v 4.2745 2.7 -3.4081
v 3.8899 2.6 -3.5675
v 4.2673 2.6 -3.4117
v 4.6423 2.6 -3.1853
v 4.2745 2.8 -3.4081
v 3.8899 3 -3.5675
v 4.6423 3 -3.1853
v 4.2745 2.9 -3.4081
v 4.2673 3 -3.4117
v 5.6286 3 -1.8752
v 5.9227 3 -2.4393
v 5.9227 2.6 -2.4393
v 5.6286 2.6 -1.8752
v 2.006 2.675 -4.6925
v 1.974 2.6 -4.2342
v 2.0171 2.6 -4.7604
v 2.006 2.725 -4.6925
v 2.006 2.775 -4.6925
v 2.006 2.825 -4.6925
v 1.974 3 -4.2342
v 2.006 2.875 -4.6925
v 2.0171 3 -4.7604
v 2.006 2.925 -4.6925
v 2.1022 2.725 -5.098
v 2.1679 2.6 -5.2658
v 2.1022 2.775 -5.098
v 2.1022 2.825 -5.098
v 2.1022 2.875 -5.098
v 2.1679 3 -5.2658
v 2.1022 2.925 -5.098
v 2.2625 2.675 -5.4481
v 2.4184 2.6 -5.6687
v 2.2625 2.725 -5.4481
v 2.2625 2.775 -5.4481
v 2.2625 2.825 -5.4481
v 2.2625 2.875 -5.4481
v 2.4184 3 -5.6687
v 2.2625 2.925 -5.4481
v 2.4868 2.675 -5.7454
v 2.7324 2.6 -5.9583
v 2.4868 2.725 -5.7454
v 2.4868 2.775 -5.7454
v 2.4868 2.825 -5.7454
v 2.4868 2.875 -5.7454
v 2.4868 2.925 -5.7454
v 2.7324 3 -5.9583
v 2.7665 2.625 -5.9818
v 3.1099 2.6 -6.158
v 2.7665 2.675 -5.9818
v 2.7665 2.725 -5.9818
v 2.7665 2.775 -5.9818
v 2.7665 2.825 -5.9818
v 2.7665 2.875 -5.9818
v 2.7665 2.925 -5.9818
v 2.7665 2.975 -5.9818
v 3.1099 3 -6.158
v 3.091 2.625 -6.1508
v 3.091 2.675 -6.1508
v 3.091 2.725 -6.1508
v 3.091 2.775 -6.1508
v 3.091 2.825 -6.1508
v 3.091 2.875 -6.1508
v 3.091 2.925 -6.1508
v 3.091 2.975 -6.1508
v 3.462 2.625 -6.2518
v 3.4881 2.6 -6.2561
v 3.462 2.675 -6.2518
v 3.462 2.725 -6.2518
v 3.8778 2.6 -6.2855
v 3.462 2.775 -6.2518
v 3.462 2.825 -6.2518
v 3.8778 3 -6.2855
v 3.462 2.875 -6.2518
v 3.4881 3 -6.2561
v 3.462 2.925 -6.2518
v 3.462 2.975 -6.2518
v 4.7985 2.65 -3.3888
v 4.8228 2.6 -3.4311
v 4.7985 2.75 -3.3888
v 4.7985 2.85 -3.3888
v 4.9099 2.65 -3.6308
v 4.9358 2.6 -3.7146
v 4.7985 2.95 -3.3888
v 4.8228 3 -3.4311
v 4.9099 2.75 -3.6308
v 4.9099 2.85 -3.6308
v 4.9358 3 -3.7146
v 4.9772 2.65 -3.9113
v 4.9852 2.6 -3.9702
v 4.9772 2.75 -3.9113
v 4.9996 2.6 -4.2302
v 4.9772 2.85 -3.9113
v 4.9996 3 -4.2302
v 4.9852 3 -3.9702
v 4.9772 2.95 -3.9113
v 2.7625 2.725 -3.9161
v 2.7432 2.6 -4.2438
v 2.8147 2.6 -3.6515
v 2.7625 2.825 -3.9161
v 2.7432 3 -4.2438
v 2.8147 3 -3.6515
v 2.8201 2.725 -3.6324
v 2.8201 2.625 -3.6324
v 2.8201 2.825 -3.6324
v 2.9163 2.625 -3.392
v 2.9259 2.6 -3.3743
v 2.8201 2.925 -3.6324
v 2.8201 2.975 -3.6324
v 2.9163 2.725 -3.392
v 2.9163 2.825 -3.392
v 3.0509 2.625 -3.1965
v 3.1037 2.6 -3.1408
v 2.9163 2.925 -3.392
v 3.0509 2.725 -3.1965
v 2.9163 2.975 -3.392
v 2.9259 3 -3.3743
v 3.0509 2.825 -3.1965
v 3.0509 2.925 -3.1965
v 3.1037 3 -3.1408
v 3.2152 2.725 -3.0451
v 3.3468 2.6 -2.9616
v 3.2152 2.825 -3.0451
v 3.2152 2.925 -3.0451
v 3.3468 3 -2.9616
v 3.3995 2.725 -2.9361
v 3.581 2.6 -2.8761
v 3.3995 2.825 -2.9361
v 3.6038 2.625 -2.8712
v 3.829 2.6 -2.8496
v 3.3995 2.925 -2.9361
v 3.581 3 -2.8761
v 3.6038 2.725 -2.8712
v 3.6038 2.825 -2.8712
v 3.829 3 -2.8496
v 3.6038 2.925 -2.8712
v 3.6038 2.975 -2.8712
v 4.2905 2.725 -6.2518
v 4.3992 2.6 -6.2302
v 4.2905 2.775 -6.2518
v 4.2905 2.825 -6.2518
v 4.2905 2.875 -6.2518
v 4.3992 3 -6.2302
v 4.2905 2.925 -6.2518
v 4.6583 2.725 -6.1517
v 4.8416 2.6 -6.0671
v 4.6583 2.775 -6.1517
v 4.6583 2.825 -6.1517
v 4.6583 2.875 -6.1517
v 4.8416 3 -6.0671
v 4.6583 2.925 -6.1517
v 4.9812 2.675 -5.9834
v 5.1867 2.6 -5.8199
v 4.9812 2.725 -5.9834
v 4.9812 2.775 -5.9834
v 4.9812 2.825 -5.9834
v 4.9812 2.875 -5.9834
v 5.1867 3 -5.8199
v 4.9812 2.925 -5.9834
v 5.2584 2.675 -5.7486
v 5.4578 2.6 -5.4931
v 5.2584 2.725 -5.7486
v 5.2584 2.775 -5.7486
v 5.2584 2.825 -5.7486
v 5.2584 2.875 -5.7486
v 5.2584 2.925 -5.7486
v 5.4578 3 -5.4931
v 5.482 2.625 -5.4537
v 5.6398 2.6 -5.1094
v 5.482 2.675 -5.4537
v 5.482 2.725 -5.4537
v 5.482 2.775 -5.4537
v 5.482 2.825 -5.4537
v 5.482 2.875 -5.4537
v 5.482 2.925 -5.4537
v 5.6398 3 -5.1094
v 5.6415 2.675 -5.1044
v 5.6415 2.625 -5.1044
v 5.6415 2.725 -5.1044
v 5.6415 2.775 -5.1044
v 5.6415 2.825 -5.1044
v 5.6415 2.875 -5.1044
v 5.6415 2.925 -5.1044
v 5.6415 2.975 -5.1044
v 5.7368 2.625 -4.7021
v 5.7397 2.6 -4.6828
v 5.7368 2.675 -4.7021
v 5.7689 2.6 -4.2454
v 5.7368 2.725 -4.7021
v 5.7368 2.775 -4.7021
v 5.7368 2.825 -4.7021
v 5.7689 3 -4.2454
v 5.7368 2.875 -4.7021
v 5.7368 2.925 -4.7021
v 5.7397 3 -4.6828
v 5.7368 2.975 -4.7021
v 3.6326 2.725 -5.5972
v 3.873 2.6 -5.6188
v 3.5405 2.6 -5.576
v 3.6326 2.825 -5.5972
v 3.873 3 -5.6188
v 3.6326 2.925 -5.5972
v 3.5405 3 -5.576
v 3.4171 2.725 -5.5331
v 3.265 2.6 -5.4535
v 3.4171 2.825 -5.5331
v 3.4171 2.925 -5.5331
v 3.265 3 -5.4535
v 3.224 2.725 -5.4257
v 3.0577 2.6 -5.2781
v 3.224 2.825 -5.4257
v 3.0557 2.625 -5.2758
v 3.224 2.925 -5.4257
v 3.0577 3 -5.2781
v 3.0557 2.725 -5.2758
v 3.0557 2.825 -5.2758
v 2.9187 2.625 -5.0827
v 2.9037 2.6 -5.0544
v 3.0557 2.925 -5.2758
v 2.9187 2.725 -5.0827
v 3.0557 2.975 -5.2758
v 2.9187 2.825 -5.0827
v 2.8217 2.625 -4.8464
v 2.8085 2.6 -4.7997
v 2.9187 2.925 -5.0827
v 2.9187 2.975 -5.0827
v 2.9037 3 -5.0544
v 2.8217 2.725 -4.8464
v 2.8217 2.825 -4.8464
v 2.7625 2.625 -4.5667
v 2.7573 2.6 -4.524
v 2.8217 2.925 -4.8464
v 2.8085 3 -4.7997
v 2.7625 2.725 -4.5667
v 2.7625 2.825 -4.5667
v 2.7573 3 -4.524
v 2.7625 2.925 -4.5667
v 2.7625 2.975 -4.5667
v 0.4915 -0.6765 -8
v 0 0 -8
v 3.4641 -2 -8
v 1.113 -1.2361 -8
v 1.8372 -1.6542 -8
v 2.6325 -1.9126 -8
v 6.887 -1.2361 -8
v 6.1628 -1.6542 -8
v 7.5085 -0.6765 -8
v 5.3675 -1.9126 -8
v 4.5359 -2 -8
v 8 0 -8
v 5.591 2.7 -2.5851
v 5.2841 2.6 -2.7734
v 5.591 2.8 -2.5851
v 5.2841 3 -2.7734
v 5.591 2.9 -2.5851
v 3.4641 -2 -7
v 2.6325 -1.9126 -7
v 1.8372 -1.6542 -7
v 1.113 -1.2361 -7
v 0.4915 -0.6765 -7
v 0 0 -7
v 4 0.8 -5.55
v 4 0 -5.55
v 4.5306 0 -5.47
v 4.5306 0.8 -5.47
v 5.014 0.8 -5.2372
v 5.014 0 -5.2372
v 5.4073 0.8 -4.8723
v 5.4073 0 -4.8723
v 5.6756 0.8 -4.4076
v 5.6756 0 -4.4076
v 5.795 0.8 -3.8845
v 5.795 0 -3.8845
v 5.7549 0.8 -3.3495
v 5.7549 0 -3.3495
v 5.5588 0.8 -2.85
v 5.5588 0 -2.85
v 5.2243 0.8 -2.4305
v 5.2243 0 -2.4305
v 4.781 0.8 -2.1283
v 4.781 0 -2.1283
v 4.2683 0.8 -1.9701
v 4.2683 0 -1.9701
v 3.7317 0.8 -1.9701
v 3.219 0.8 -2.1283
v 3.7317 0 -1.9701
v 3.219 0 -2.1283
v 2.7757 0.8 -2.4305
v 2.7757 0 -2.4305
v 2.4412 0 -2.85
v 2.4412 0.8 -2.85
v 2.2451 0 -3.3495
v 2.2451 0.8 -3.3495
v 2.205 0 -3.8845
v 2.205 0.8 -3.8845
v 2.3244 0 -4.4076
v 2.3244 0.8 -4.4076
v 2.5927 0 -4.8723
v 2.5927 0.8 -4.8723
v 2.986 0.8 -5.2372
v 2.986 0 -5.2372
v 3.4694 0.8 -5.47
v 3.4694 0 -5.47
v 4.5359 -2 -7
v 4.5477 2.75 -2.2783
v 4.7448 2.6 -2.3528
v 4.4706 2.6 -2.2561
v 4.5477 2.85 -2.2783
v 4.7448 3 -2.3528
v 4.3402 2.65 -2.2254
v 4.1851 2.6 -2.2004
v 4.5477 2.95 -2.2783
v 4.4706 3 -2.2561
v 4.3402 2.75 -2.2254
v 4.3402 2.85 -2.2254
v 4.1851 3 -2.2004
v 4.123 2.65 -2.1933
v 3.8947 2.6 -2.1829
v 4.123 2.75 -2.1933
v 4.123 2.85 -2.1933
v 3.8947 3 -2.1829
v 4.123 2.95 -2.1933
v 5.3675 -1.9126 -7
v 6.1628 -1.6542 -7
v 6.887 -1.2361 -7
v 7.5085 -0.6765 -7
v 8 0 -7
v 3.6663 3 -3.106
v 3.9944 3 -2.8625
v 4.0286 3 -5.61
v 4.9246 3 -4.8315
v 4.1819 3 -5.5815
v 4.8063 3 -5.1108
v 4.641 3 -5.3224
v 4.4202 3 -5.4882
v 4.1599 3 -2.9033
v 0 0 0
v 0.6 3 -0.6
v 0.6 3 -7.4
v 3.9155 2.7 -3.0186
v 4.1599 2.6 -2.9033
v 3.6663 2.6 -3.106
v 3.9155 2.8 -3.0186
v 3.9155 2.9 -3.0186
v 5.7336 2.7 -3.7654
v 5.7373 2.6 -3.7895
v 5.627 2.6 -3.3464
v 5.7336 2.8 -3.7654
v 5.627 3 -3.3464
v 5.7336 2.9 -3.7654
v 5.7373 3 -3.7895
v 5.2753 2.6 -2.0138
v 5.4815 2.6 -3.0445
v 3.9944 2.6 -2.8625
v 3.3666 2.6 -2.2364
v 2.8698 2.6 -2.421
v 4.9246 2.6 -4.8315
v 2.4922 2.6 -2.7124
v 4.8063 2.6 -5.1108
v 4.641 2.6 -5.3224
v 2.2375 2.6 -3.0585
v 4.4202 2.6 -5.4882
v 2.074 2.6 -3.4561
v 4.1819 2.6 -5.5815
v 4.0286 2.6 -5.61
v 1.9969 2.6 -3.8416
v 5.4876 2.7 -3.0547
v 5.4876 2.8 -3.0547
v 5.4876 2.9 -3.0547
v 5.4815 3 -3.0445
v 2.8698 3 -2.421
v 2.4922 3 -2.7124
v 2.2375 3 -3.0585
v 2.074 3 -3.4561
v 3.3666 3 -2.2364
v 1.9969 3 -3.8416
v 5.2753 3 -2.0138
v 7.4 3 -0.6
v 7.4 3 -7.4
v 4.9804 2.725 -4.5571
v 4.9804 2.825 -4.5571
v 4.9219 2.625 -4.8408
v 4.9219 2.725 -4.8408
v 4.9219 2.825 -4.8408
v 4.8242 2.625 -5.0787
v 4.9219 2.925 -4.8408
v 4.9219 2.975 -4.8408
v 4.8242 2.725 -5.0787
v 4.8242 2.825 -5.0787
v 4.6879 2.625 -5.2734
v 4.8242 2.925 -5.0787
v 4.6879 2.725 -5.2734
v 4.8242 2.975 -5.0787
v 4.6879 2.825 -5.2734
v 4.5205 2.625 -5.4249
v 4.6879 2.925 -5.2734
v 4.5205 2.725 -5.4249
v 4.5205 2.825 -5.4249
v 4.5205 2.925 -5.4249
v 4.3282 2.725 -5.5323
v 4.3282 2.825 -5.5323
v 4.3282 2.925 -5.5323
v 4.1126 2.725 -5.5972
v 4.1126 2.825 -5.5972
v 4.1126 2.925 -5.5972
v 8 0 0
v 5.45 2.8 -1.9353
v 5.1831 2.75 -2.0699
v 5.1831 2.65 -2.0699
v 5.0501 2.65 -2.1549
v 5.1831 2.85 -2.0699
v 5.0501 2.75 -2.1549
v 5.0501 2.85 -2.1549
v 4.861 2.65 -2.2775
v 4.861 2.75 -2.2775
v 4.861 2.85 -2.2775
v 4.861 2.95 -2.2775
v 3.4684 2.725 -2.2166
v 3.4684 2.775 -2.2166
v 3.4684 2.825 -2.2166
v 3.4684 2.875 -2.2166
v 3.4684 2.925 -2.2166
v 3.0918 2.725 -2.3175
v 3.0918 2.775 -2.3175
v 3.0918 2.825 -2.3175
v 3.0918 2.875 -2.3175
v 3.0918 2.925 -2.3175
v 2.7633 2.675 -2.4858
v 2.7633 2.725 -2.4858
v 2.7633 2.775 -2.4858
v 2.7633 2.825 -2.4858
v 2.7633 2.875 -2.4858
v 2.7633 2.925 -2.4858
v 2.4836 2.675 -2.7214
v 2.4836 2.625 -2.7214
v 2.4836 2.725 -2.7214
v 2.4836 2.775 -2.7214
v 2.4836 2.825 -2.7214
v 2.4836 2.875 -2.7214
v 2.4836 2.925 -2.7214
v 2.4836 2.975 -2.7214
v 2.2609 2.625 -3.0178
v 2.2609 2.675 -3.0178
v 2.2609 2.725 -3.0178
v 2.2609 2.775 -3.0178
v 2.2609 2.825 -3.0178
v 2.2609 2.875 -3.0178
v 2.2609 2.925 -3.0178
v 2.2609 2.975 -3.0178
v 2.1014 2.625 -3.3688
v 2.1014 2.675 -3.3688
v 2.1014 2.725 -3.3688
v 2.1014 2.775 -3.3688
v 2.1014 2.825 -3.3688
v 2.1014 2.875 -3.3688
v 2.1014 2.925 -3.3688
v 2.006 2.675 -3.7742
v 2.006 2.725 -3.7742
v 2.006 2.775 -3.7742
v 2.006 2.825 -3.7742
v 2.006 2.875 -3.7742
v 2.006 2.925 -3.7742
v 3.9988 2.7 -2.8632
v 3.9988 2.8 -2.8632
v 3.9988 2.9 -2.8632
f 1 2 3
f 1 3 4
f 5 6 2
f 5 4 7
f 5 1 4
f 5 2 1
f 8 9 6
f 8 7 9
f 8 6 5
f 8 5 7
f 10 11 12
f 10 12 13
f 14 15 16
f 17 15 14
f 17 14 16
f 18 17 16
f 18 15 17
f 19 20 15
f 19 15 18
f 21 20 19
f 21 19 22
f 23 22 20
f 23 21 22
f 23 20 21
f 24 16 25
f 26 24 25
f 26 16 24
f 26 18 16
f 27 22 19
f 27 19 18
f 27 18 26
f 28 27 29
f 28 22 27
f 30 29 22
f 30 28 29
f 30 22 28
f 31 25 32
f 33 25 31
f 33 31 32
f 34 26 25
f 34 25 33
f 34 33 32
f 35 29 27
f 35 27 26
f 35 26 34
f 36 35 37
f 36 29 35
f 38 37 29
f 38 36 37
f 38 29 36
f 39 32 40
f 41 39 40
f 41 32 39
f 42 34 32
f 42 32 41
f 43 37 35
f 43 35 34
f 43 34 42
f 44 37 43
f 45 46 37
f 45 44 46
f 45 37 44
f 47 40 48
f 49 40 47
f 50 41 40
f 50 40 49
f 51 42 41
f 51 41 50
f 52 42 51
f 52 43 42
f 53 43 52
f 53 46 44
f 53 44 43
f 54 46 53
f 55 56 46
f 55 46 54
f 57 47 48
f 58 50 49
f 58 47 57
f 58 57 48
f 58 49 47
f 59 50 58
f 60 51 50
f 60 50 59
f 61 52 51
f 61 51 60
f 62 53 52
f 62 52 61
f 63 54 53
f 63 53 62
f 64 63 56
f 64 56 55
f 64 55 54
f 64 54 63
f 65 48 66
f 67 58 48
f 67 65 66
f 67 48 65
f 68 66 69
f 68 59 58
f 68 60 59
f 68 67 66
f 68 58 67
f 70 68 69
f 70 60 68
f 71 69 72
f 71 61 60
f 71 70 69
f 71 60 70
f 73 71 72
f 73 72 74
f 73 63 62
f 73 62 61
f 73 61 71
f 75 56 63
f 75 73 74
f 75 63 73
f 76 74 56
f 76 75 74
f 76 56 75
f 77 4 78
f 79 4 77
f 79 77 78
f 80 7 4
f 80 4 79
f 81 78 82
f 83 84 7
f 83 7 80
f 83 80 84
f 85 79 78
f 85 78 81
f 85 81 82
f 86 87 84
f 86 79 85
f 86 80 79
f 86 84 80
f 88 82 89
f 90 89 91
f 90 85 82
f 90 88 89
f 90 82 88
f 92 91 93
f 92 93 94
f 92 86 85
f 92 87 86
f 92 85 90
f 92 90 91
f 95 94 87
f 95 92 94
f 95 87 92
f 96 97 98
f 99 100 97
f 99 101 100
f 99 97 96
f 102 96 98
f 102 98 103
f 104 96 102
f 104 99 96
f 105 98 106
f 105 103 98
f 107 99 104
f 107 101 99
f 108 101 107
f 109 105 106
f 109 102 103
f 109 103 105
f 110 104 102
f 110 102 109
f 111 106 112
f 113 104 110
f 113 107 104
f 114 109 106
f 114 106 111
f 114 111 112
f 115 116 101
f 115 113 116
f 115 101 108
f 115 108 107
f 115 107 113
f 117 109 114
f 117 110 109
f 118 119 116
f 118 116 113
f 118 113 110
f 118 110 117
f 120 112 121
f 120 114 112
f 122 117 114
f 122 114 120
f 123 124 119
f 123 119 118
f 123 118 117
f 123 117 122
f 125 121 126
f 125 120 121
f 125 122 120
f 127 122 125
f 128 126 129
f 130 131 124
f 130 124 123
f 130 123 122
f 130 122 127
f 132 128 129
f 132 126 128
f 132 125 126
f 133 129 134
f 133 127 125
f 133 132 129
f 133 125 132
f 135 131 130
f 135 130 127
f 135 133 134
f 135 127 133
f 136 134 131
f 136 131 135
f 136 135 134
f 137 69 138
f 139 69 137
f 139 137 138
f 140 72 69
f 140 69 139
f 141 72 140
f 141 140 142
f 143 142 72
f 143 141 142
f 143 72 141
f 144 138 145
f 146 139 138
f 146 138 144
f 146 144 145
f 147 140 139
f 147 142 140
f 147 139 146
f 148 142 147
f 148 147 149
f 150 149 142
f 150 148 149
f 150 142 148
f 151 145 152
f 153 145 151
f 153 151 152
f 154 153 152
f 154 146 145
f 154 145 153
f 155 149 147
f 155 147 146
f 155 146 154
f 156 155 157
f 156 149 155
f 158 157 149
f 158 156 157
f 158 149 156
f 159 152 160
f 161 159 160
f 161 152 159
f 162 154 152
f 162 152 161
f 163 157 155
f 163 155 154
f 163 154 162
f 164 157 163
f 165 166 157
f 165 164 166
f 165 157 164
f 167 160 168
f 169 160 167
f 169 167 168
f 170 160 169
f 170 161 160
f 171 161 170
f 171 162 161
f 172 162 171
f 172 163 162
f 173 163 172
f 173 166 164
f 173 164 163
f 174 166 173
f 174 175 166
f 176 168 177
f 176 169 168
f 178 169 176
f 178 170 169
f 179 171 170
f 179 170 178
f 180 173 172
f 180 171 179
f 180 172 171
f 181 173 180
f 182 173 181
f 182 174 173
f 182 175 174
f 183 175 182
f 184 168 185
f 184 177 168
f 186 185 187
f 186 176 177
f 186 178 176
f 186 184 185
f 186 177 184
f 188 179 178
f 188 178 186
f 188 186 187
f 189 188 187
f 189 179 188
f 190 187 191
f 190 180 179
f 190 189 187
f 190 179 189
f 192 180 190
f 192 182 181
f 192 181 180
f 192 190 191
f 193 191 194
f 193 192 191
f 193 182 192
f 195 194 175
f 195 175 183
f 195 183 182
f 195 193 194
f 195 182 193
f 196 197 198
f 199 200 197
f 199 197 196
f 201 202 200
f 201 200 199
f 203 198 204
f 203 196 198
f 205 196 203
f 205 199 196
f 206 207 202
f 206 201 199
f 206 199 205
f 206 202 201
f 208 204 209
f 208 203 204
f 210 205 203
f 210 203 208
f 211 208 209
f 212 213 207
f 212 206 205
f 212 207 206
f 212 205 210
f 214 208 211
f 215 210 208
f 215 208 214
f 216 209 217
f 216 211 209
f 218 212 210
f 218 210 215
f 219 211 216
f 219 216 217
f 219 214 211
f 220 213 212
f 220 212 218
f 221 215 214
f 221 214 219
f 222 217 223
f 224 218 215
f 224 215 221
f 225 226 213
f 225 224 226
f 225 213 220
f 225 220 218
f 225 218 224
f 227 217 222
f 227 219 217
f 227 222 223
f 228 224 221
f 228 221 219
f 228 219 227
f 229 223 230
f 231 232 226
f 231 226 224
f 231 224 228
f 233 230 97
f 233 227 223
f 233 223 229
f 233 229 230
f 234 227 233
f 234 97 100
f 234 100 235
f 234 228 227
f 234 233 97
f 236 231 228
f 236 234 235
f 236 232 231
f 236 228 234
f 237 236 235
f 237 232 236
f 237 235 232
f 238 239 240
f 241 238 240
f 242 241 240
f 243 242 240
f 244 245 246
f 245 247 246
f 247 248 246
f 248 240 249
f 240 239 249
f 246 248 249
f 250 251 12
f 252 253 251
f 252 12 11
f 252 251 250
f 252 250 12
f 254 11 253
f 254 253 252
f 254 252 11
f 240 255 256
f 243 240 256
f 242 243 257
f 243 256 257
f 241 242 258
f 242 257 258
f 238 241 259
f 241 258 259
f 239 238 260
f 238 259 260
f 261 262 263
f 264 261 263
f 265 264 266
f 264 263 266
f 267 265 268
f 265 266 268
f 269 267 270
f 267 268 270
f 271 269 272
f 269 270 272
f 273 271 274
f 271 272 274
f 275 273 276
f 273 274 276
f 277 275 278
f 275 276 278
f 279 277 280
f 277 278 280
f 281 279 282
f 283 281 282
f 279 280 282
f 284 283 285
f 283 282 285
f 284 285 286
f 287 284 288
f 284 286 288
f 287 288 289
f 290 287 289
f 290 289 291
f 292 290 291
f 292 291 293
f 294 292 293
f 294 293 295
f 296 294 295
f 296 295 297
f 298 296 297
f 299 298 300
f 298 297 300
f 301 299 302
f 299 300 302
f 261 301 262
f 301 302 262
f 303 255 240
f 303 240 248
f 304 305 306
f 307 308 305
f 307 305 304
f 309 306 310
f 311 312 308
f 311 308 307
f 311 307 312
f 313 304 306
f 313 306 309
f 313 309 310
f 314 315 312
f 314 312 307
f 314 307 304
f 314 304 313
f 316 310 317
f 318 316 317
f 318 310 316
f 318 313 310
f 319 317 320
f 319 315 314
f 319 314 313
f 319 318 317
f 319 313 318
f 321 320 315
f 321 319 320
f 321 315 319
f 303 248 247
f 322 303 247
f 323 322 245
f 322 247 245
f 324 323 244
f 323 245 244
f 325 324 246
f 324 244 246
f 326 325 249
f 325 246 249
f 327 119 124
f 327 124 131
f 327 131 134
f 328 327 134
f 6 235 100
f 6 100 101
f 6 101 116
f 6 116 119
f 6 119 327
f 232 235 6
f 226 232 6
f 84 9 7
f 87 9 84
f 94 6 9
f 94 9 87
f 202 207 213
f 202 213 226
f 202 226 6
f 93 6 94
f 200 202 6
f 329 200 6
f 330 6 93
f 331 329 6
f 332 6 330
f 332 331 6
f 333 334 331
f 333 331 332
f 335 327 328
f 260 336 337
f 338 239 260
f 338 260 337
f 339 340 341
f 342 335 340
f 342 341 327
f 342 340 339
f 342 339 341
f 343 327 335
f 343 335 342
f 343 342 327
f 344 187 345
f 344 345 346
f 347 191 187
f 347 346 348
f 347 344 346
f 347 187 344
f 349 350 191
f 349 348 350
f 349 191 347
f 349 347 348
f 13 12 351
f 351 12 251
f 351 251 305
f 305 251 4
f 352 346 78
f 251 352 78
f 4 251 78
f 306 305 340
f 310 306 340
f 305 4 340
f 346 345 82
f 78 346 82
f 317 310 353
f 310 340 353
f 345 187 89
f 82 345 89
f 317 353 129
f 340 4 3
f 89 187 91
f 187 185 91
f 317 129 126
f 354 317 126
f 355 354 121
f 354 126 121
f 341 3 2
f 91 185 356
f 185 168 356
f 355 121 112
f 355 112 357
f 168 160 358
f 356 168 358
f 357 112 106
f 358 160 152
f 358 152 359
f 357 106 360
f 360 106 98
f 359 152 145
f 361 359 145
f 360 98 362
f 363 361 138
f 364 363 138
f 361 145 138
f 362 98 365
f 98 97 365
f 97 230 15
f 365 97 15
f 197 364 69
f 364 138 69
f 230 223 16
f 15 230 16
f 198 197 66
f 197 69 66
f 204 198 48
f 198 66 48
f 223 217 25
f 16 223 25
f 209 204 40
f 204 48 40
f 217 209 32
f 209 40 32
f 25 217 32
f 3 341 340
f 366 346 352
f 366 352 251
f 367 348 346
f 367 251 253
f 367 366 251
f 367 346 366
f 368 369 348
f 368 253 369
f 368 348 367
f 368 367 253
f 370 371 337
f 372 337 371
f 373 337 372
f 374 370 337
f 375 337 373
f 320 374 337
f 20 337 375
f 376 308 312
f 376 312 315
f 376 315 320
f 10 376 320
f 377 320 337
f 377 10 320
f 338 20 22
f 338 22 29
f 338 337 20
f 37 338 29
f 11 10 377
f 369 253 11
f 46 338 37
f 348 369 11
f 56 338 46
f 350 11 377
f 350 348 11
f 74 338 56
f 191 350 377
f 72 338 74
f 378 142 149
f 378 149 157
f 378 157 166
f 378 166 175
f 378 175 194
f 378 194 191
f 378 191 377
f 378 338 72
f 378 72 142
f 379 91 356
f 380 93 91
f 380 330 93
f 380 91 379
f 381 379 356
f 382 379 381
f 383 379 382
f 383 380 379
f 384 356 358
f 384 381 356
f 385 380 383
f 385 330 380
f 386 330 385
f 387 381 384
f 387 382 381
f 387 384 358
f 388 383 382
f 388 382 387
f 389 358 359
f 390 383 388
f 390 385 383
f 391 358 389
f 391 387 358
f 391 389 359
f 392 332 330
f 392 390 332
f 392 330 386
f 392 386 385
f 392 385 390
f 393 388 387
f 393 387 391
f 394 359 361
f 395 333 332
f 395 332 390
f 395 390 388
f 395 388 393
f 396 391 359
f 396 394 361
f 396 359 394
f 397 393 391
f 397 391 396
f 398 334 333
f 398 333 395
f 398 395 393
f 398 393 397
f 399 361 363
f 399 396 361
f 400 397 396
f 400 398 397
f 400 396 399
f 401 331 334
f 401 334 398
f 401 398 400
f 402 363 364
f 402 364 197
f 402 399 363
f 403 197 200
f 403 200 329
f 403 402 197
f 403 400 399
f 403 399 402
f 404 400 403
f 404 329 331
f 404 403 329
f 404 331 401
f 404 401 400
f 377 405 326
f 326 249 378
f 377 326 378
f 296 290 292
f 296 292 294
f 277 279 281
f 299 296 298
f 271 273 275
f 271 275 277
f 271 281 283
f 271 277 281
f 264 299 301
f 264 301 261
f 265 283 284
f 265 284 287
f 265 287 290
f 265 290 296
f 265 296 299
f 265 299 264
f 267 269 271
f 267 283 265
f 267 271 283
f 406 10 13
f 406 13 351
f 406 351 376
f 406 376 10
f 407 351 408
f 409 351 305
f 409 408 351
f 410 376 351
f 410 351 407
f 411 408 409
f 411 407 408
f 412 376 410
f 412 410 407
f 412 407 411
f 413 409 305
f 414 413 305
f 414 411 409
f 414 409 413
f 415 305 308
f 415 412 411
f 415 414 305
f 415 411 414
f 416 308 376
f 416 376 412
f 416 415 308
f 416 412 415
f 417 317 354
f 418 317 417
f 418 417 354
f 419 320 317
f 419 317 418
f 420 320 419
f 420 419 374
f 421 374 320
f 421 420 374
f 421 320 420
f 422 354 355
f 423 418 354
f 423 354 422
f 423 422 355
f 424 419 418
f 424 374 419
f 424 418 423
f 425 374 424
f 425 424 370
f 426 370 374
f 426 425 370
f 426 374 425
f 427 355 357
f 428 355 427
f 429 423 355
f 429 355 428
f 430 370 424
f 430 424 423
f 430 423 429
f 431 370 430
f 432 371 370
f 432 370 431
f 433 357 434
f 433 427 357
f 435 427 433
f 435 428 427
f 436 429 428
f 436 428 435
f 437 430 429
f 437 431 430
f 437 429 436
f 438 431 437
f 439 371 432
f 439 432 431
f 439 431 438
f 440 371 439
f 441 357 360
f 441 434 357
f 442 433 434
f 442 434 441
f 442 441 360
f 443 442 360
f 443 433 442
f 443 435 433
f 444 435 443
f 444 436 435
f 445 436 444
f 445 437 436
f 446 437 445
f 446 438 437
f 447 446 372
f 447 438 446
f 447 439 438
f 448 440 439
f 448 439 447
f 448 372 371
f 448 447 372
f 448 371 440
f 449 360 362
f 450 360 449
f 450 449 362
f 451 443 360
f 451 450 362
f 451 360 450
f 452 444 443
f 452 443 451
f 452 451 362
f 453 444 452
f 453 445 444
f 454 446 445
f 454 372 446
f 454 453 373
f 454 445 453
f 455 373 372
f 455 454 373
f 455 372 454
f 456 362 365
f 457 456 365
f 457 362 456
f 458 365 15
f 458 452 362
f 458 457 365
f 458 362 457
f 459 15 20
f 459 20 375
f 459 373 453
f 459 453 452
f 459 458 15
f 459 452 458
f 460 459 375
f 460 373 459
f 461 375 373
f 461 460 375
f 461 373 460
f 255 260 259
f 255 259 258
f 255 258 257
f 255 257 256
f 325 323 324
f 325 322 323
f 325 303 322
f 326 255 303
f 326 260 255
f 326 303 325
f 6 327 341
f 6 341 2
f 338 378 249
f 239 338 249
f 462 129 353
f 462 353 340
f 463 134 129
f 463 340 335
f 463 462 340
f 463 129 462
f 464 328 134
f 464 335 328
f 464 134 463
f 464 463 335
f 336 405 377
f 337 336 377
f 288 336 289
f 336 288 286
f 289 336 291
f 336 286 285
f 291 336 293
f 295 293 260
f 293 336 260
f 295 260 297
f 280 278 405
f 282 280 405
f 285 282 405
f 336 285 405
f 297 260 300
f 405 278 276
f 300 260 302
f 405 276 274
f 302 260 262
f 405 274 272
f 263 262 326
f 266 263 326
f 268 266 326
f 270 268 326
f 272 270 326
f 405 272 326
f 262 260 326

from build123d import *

# Parameters (mm, degrees)
SKETCH1_W               = 8
SKETCH1_H               = 8
BOSS_EXTRUDE1_DEPTH     = 3
CUT_EXTRUDE1_DEPTH      = 12.704699911
CUT_EXTRUDE1_DEPTH_BACK = 12.704699911
CUT_EXTRUDE2_DEPTH      = 11
SKETCH4_R               = 1.8
CUT_EXTRUDE3_DEPTH      = 0.8
SKETCH5_W               = 8
SKETCH5_H               = 1
BOSS_EXTRUDE2_DEPTH     = 2
FILLET1_R               = 4
CUT_EXTRUDE4_DEPTH      = 0.4


with BuildPart() as part:
    # Sketch1 → Boss-Extrude1 (new body)
    with BuildSketch(Plane(origin=(0, 0, 0), x_dir=(1, 0, 0), z_dir=(0, 1, 0))):
        with Locations((4, 4)):
            Rectangle(SKETCH1_W, SKETCH1_H)
    extrude(amount=BOSS_EXTRUDE1_DEPTH)

    # Sketch2 → Cut-Extrude1 (cut, two sides: drawn at the far end of the back side and taken through both)
    with BuildSketch(Plane.XY.offset(-CUT_EXTRUDE1_DEPTH_BACK)):
        Polygon((0, 0), (0.6, 3), (0, 3), align=None)
        Polygon((8, 0), (7.4, 3), (8, 3), align=None)
    extrude(amount=CUT_EXTRUDE1_DEPTH + CUT_EXTRUDE1_DEPTH_BACK, mode=Mode.SUBTRACT)

    # Sketch3 → Cut-Extrude2 (cut)
    with BuildSketch(Plane(origin=(0, 0, 0), x_dir=(0, 0, -1), z_dir=(1, 0, 0))):
        Polygon((0, 0), (0.6, 3), (0, 3), align=None)
        Polygon((8, 3), (7.4, 3), (8, 0), align=None)
    extrude(amount=CUT_EXTRUDE2_DEPTH, mode=Mode.SUBTRACT)

    # Sketch4 → Cut-Extrude3 (cut)
    with BuildSketch(Plane.XZ):
        with Locations(Location((4, -3.75, 0), (0, 0, 270))):
            Circle(SKETCH4_R)
    extrude(amount=-CUT_EXTRUDE3_DEPTH, mode=Mode.SUBTRACT)

    # Sketch5 → Boss-Extrude2 (add)
    with BuildSketch(Plane.XZ):
        with Locations((4, -7.5)):
            Rectangle(SKETCH5_W, SKETCH5_H)
    extrude(amount=BOSS_EXTRUDE2_DEPTH)

    # Fillet1
    # the kernel refuses this fillet: 4 mm, written as the material it takes off along each edge
    with BuildSketch(Plane(origin=(8, -2, -16.660254038), x_dir=(0, 1, 0), z_dir=(0, 0, 1)), Plane(origin=(0, -2, 1.660254038), x_dir=(0, 1, 0), z_dir=(0, 0, -1))) as fillet1_piece_1:
        with BuildLine():
            CenterArc((4, 3.464101615), FILLET1_R, 180, 60)
            Line((0, 3.464101615), (-0.08, 3.464101615))
            Line((-0.08, 3.464101615), (-0.08, 0))
            Line((-0.08, 0), (0, -0.08))
            ThreePointArc((0, -0.08), (1, -0.08), (1.96, -0.069282032))
            Line((1.96, -0.069282032), (2, 0))
        make_face()
    extrude(amount=18.320508076, mode=Mode.SUBTRACT)

    # Sketch6 → Cut-Extrude4 (cut)
    with BuildSketch(Plane(origin=(0, 3, 0), x_dir=(1, 0, 0), z_dir=(0, 1, 0))):
        with BuildLine():
            add(Edge.make_bspline(
                [(5.284087955, 2.773445367), (5.333545491, 2.739545524), (5.432652736, 2.671614118), (5.590291823, 2.583736248), (5.752942084, 2.503846486), (5.865979951, 2.460876102), (5.92270975, 2.439310751)],
                knots=[0, 0, 0, 0, 0.994855506, 1.99357661, 2.993045438, 4, 4, 4, 4], degree=3))
            Line((5.92270975, 2.439310751), (5.628639237, 1.875208187))
            add(Edge.make_bspline(
                [(5.628639237, 1.875208187), (5.568520037, 1.893818156), (5.447325875, 1.93133395), (5.332925255, 1.986187111), (5.275273852, 2.013829982)],
                knots=[0, 0, 0, 0, 0.992113803, 2, 2, 2, 2], degree=3))
            add(Edge.make_bspline(
                [(5.275273852, 2.013829982), (5.26961656, 2.016684314), (5.253233801, 2.024950075), (5.223476786, 2.045298413), (5.178074812, 2.072724498), (5.118973761, 2.11071311), (5.045578888, 2.157800121), (4.95765273, 2.213934729), (4.856407872, 2.280704114), (4.783596416, 2.327731001), (4.744825134, 2.35277229)],
                knots=[0, 0, 0, 0, 0.241377655, 0.698997227, 1.371388316, 2.263975901, 3.376788369, 4.695767198, 6.240533187, 8, 8, 8, 8], degree=3))
            add(Edge.make_bspline(
                [(4.744825134, 2.35277229), (4.712670389, 2.339001865), (4.648050063, 2.311327899), (4.547788838, 2.27725121), (4.444978029, 2.248544986), (4.339982896, 2.224200245), (4.232359046, 2.206111381), (4.122258624, 2.192239309), (4.00937299, 2.18410397), (3.933139287, 2.183304154), (3.894664878, 2.182900495)],
                knots=[0, 0, 0, 0, 0.961025642, 1.931341354, 2.907359807, 3.893838693, 4.891829695, 5.905170566, 6.942759923, 8, 8, 8, 8], degree=3))
            add(Edge.make_bspline(
                [(3.894664878, 2.182900495), (3.821683976, 2.184676763), (3.679027131, 2.188148859), (3.471015208, 2.212756542), (3.275562804, 2.255408477), (3.091812023, 2.313667662), (2.920867424, 2.390147666), (2.761229426, 2.482594503), (2.615108223, 2.593406711), (2.480490537, 2.71918809), (2.361392609, 2.861354588), (2.257130725, 3.017424584), (2.168806746, 3.186880722), (2.097587685, 3.370615377), (2.041301668, 3.567142879), (2.002926315, 3.777850586), (1.978227581, 4.001488849), (1.975427333, 4.155321196), (1.973991801, 4.234182546)],
                knots=[0, 0, 0, 0, 1.098101164, 2.146474535, 3.146072545, 4.104420533, 5.041773038, 5.958565538, 6.874115049, 7.795336865, 8.725215067, 9.658214839, 10.614563411, 11.594512188, 12.618591104, 13.685899083, 14.813688224, 16, 16, 16, 16], degree=3))
            add(Edge.make_bspline(
                [(1.973991801, 4.234182546), (1.97543059, 4.313040679), (1.978227497, 4.466335509), (2.002757559, 4.689542909), (2.042412611, 4.899497801), (2.098124704, 5.096337583), (2.170410456, 5.279545107), (2.259079723, 5.449017762), (2.363505524, 5.605417057), (2.484015277, 5.747270094), (2.617919267, 5.874338646), (2.764464989, 5.984327234), (2.9219486, 6.078236158), (3.090996271, 6.154643933), (3.272074664, 6.212871015), (3.463805003, 6.255387163), (3.667248709, 6.280295733), (3.806454886, 6.283712517), (3.877837955, 6.285464598)],
                knots=[0, 0, 0, 0, 1.193283781, 2.319662245, 3.393996131, 4.424093603, 5.411284417, 6.369670503, 7.313761776, 8.251713527, 9.181123148, 10.102053383, 11.01932051, 11.951118596, 12.903560284, 13.893239571, 14.919681386, 16, 16, 16, 16], degree=3))
            add(Edge.make_bspline(
                [(3.877837955, 6.285464598), (3.948708316, 6.284176334), (4.086935049, 6.281663683), (4.288489067, 6.254790298), (4.478939684, 6.214016744), (4.658513444, 6.155241629), (4.826290277, 6.078911265), (4.983143341, 5.98623667), (5.128157857, 5.876434989), (5.26137487, 5.750578969), (5.380523981, 5.609215368), (5.486073462, 5.454669187), (5.572731816, 5.285035211), (5.645736122, 5.103191508), (5.700157026, 4.90736457), (5.740330715, 4.69867705), (5.764520815, 4.476471411), (5.76739165, 4.323719862), (5.768863596, 4.245400495)],
                knots=[0, 0, 0, 0, 1.078752742, 2.104017338, 3.091035458, 4.041673215, 4.975566109, 5.892967701, 6.810684895, 7.740128604, 8.678185021, 9.621404646, 10.583875016, 11.573429805, 12.6009998, 13.674031063, 14.80742018, 16, 16, 16, 16], degree=3))
            add(Edge.make_bspline(
                [(5.768863596, 4.245400495), (5.767275795, 4.16278925), (5.764189157, 4.002195454), (5.737326284, 3.768977018), (5.693780668, 3.550562854), (5.648918616, 3.41330904), (5.627036673, 3.346362034)],
                knots=[0, 0, 0, 0, 1.083667057, 2.106616435, 3.076482036, 4, 4, 4, 4], degree=3))
            add(Edge.make_bspline(
                [(5.627036673, 3.346362034), (5.607421404, 3.297050064), (5.567517691, 3.196733787), (5.488642668, 3.051933408), (5.394797316, 2.909076479), (5.321514211, 2.819296637), (5.284087955, 2.773445367)],
                knots=[0, 0, 0, 0, 0.948216854, 1.928975575, 2.942311585, 4, 4, 4, 4], degree=3))
        make_face()
        with BuildLine():
            add(Edge.make_bspline(
                [(4.642261032, 3.185304341), (4.671182259, 3.216922768), (4.72909393, 3.280235293), (4.800707281, 3.388678336), (4.863230922, 3.50497094), (4.912388312, 3.632014464), (4.951923574, 3.76787431), (4.97951585, 3.913560578), (4.996652709, 4.068707035), (4.998621406, 4.175375245), (4.999632827, 4.230176136)],
                knots=[0, 0, 0, 0, 0.906820982, 1.815812261, 2.745108282, 3.70056618, 4.696560745, 5.740060838, 6.83895416, 8, 8, 8, 8], degree=3))
            add(Edge.make_bspline(
                [(4.999632827, 4.230176136), (4.998745764, 4.286560817), (4.997027382, 4.395786947), (4.982794262, 4.554398979), (4.957747484, 4.70183414), (4.925058455, 4.838707416), (4.88052022, 4.963910999), (4.826807351, 5.078388614), (4.763835344, 5.182421929), (4.690056733, 5.274294514), (4.608907177, 5.355063587), (4.522159409, 5.426414517), (4.428546166, 5.486139657), (4.328544236, 5.534184829), (4.222990468, 5.571989212), (4.111634776, 5.59943433), (3.994225982, 5.615495039), (3.913944994, 5.6176829), (3.873030263, 5.618797931)],
                knots=[0, 0, 0, 0, 1.335693338, 2.587451293, 3.768164612, 4.876224393, 5.916940853, 6.910477009, 7.867661778, 8.790666633, 9.694493319, 10.576027549, 11.446684429, 12.318352473, 13.199023277, 14.098364444, 15.030842682, 16, 16, 16, 16], degree=3))
            add(Edge.make_bspline(
                [(3.873030263, 5.618797931), (3.831841607, 5.617719084), (3.751279942, 5.615608947), (3.633755604, 5.599158788), (3.522145798, 5.573035665), (3.416723766, 5.534932642), (3.316536446, 5.486796326), (3.222573421, 5.427181815), (3.134847786, 5.356951252), (3.053289548, 5.276692152), (2.980446173, 5.184790487), (2.915694165, 5.082568667), (2.862164439, 4.968850144), (2.819178201, 4.84427298), (2.784825228, 4.709477379), (2.760087026, 4.563739976), (2.745835322, 4.407279692), (2.744110931, 4.299383286), (2.74322257, 4.243797931)],
                knots=[0, 0, 0, 0, 0.980107447, 1.917010591, 2.819119613, 3.703969481, 4.579773866, 5.459928929, 6.346604172, 7.250235365, 8.177620171, 9.131899985, 10.124404622, 11.161948974, 12.264485933, 13.431998172, 14.677033863, 16, 16, 16, 16], degree=3))
            add(Edge.make_bspline(
                [(2.74322257, 4.243797931), (2.744089067, 4.187408458), (2.745771696, 4.077907007), (2.760333697, 3.91913972), (2.783941374, 3.771215716), (2.817547327, 3.634196218), (2.86051391, 3.507924697), (2.913437174, 3.392577112), (2.976036542, 3.288297709), (3.048513511, 3.196032652), (3.128245057, 3.114861766), (3.213441608, 3.04409835), (3.303411645, 2.983479498), (3.39857486, 2.934226809), (3.498956775, 2.896402137), (3.604207339, 2.869103357), (3.714939061, 2.852831885), (3.790443662, 2.850669982), (3.82895975, 2.849567162)],
                knots=[0, 0, 0, 0, 1.356840463, 2.634818045, 3.833173645, 4.958776583, 6.025986406, 7.038359119, 8.007356852, 8.946032033, 9.855123386, 10.740685277, 11.607120956, 12.460971081, 13.313368256, 14.183325659, 15.073285775, 16, 16, 16, 16], degree=3))
            add(Edge.make_bspline(
                [(3.82895975, 2.849567162), (3.857844622, 2.850073951), (3.914741814, 2.851072222), (3.998801079, 2.862293633), (4.080683558, 2.878515583), (4.133570622, 2.895033243), (4.159889237, 2.903253059)],
                knots=[0, 0, 0, 0, 1.028828871, 2.026578908, 3.017950568, 4, 4, 4, 4], degree=3))
            add(Edge.make_bspline(
                [(4.159889237, 2.903253059), (4.119539232, 2.924336443), (4.039635796, 2.966086993), (3.916101198, 3.019284802), (3.792319766, 3.067214804), (3.708133251, 3.09310976), (3.666299493, 3.105977418)],
                knots=[0, 0, 0, 0, 1.021704821, 2.023239566, 3.017713044, 4, 4, 4, 4], degree=3))
            Line((3.666299493, 3.105977418), (3.889857186, 3.56751588))
            add(Edge.make_bspline(
                [(3.889857186, 3.56751588), (3.955233958, 3.544923565), (4.086618506, 3.49952088), (4.276409331, 3.409366748), (4.463555304, 3.306758821), (4.582244486, 3.226093623), (4.642261032, 3.185304341)],
                knots=[0, 0, 0, 0, 0.979271047, 1.967993817, 2.972492781, 4, 4, 4, 4], degree=3))
        make_face(mode=Mode.SUBTRACT)
    extrude(amount=-CUT_EXTRUDE4_DEPTH, mode=Mode.SUBTRACT)


solid = part.part
